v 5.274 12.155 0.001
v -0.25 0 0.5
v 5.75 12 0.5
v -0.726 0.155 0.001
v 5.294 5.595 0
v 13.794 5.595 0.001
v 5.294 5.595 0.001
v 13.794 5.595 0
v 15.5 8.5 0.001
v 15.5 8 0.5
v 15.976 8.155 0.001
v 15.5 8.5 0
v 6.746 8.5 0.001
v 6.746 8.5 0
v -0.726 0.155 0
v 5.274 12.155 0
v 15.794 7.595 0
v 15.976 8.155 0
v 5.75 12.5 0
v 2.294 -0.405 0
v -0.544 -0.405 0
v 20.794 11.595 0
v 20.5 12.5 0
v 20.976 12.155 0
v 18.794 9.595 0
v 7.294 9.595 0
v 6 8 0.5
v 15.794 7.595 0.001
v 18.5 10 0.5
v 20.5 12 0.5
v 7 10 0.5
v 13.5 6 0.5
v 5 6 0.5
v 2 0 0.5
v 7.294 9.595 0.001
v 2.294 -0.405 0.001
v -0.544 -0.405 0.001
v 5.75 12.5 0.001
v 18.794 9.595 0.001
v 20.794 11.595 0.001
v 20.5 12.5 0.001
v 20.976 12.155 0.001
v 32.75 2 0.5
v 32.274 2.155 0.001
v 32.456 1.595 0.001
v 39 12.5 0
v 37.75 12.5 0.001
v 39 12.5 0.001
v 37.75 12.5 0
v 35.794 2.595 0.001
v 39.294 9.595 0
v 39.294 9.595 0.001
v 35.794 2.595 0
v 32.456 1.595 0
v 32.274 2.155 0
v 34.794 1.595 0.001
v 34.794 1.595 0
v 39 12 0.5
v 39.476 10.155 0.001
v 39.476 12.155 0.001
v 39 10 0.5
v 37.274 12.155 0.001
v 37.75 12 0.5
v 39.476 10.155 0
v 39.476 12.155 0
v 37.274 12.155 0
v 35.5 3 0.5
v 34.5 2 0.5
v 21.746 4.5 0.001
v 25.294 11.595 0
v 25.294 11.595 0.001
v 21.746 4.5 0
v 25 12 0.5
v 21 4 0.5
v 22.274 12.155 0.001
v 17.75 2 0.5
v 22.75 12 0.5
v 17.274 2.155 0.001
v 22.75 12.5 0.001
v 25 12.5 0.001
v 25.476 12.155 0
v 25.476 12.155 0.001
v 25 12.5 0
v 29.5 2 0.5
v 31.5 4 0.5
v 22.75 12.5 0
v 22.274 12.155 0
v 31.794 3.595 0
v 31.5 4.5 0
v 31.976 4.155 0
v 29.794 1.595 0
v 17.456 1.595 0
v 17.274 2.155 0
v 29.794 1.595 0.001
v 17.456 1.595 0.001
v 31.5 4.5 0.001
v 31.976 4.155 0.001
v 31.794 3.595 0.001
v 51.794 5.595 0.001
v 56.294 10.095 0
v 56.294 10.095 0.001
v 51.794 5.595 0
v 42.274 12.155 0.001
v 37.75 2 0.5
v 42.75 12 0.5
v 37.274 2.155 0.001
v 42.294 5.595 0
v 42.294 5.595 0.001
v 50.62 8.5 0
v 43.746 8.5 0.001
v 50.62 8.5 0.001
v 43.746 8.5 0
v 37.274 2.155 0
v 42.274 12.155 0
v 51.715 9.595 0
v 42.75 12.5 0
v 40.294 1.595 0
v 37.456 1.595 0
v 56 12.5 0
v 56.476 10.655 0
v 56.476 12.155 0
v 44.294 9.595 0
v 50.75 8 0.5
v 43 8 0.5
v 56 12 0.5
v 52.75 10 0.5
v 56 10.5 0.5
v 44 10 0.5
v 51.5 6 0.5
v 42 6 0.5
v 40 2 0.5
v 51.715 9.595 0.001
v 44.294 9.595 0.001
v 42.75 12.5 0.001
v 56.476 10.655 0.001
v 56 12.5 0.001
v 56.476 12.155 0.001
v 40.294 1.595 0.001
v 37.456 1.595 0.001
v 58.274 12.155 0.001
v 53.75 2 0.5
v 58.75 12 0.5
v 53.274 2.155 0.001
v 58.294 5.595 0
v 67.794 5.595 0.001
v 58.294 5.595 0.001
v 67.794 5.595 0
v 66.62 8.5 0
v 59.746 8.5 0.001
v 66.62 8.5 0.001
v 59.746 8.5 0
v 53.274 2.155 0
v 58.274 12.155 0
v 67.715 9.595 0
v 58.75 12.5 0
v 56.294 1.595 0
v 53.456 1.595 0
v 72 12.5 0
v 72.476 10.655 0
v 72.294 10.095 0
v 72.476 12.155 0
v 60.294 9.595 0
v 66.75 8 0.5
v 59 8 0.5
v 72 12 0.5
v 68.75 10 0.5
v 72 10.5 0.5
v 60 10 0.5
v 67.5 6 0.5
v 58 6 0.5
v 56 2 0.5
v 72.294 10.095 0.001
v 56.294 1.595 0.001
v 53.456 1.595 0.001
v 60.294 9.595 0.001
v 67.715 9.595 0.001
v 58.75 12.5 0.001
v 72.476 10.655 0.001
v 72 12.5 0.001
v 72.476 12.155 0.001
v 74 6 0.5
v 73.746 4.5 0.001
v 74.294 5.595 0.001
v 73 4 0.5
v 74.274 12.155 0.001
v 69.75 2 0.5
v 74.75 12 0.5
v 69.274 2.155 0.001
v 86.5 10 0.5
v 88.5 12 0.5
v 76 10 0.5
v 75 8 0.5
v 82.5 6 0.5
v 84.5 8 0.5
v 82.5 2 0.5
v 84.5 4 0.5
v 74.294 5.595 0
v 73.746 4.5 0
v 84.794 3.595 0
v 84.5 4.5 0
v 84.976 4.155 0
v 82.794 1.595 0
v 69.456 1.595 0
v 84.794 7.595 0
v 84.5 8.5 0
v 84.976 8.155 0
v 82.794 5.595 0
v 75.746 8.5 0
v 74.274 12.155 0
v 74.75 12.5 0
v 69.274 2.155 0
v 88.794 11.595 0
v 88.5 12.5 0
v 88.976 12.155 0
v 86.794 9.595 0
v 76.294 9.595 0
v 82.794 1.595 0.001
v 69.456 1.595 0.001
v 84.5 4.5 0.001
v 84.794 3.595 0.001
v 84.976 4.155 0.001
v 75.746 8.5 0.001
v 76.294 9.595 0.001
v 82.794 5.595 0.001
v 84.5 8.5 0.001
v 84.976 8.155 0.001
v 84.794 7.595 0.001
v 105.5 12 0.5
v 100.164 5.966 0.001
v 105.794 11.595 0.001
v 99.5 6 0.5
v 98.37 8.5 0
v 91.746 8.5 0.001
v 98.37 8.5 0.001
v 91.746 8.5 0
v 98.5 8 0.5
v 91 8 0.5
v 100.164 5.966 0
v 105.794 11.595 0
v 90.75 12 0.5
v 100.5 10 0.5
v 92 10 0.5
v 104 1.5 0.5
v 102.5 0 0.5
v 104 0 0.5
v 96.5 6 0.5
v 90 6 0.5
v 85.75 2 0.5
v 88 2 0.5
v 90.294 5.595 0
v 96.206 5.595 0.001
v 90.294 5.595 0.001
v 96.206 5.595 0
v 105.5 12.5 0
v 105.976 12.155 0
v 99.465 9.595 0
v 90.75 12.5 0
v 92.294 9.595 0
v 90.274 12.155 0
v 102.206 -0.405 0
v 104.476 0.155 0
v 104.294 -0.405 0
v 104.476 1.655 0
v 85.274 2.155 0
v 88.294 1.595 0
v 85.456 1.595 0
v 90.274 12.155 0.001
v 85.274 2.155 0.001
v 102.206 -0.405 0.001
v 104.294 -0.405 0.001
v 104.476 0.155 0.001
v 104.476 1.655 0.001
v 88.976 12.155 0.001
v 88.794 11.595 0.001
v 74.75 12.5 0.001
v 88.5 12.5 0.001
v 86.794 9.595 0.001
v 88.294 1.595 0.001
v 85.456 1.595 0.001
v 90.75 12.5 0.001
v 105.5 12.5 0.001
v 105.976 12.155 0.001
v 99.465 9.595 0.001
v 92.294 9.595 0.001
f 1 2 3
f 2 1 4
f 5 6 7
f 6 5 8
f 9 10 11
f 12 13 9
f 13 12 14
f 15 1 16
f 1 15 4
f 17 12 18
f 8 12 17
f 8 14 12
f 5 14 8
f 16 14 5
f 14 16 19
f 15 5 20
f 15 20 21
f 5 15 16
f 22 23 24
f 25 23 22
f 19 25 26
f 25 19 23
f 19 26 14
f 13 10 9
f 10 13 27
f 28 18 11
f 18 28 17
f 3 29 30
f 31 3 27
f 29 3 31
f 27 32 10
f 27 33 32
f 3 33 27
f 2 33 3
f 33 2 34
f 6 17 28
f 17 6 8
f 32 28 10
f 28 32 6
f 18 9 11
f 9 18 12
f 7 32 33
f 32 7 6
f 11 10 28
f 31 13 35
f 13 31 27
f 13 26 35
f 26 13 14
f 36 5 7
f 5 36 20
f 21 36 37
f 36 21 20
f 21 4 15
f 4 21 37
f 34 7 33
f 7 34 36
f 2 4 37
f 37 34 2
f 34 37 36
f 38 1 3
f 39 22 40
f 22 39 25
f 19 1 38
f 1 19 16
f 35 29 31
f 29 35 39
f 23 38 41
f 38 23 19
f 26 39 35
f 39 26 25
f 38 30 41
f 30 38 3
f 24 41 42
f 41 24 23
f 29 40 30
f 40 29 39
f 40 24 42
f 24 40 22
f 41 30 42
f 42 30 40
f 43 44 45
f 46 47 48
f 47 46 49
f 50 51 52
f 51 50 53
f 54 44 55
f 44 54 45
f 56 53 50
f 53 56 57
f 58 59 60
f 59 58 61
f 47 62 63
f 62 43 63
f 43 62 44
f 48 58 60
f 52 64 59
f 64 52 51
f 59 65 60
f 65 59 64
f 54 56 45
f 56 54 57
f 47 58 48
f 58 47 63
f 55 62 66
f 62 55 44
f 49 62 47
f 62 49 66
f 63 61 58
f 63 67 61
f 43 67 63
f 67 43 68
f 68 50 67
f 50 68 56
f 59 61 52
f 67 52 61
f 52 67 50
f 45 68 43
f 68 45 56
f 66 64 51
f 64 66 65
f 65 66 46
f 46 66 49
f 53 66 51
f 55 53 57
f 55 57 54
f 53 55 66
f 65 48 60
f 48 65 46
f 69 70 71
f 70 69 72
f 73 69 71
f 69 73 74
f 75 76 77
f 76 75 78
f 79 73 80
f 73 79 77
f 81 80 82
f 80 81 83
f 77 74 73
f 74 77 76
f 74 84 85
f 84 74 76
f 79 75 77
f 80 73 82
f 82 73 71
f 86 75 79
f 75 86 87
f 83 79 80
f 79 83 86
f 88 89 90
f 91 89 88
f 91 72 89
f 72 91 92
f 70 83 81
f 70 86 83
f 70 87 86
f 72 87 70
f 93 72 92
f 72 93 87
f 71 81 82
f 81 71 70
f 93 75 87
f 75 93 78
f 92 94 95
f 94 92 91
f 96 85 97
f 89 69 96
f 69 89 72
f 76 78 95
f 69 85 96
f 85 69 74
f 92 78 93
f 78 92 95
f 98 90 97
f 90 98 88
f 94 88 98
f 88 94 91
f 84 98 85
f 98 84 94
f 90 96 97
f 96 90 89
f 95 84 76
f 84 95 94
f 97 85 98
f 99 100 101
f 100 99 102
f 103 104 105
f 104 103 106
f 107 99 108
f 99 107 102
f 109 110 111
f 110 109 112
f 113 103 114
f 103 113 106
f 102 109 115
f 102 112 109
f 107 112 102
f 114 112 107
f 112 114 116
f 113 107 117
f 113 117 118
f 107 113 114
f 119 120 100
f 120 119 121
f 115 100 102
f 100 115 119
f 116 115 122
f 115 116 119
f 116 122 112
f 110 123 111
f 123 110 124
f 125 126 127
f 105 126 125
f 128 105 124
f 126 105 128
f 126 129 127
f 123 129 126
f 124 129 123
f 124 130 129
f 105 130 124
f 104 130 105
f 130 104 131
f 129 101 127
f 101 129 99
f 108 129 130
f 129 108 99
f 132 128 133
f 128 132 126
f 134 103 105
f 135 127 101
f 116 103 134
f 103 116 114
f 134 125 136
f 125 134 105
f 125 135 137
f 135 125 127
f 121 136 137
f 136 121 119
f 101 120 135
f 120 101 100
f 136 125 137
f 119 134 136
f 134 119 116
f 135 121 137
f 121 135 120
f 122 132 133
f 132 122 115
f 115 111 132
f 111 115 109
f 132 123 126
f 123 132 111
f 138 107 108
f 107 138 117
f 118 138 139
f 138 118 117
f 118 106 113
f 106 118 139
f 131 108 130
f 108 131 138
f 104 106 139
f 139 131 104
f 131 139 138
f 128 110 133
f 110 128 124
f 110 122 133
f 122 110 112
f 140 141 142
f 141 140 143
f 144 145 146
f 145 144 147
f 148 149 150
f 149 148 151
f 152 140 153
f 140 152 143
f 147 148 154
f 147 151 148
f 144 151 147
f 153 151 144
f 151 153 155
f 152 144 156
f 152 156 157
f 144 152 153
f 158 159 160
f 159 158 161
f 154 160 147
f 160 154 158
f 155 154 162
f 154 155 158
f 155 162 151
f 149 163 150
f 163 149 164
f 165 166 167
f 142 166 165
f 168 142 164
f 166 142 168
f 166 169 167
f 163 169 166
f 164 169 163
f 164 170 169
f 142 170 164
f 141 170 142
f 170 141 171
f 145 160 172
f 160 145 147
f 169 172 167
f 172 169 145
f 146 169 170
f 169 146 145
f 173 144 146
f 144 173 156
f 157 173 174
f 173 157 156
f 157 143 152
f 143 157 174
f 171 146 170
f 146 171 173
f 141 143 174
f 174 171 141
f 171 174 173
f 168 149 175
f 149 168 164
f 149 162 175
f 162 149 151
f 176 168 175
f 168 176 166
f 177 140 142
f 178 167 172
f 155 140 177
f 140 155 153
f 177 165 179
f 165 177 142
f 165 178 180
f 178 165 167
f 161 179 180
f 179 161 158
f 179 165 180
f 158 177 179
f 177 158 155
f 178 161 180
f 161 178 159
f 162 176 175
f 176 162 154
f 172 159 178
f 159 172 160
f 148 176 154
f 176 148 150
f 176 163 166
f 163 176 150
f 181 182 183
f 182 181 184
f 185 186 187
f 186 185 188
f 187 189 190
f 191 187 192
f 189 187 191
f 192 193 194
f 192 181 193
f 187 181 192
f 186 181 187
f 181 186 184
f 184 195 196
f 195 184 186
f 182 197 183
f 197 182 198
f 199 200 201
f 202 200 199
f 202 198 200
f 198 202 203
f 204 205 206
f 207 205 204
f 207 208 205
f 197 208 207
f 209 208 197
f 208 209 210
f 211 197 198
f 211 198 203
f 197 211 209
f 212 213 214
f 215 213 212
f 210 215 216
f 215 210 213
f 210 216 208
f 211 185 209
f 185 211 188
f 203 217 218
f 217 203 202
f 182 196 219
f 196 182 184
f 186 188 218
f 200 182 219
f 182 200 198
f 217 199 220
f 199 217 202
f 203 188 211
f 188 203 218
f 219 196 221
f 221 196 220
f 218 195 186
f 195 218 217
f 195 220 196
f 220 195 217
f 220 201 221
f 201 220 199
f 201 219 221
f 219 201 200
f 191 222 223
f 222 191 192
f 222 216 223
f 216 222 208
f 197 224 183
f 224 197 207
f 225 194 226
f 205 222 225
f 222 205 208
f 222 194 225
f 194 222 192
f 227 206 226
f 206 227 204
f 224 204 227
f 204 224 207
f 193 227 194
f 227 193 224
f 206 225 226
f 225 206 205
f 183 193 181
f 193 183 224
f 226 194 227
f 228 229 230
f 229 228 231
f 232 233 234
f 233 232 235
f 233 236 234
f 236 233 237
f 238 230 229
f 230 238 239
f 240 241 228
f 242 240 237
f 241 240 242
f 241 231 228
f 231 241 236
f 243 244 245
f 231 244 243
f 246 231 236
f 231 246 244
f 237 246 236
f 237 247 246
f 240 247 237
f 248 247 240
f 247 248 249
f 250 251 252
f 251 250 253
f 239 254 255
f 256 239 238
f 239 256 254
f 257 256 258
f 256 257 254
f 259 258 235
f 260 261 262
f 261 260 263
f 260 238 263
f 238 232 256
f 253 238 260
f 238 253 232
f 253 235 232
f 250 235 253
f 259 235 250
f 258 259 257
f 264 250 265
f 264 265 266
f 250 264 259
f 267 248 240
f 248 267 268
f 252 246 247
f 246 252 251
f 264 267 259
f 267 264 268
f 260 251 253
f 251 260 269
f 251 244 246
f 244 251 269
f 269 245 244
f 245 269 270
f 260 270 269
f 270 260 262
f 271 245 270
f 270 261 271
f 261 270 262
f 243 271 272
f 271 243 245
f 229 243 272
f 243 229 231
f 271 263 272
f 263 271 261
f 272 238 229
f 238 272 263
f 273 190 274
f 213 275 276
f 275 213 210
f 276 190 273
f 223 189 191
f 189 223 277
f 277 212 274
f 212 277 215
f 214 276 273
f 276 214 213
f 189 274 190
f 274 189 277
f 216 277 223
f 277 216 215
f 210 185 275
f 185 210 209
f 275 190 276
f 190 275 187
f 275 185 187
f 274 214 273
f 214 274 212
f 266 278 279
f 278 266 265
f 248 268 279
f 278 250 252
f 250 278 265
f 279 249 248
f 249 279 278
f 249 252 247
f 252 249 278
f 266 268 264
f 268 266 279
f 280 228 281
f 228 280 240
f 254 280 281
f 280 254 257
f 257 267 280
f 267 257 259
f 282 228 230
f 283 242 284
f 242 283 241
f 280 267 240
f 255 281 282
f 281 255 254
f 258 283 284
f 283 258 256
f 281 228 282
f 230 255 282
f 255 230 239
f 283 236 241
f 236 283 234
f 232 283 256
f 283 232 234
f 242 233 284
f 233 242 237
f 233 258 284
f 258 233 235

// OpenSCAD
if ($preview)
{
  S = 2.834646;

  scale([S, S, 1])
  import("orange_text_transparent.svg");
}

t_F = [ [-0.25, 0], [0, 0.5], [5, 10.5], [5.75, 12], [20.5, 12], [18.5, 10], [7, 10], [6, 8], [15.5, 8], [13.5, 6], [5, 6], [2, 0] ];
t_l = [ [17.75, 2], [22.75, 12], [25, 12], [21, 4], [31.5, 4], [29.5, 2] ];
t_i = [ [32.75, 2], [37.75, 12], [39, 12], [39, 10], [35.5, 3], [34.5, 2] ];
t_p = [ [37.75, 2], [42.75, 12], [56, 12], [56, 10.5], [51.5, 6], [42, 6], [40, 2] ];
t_p_h = [ [43, 8], [44, 10], [52.75, 10], [50.75, 8] ];
t_p_2 = [ [53.75, 2], [58.75, 12], [72, 12], [72, 10.5], [67.5, 6], [58, 6], [56, 2] ];
t_p_2_h = [ [59, 8], [60, 10], [68.75, 10], [66.75, 8] ];
t_e = [ [69.75, 2], [74.75, 12], [88.5, 12], [86.5, 10], [76, 10], [75, 8], [84.5, 8], [82.5, 6], [74, 6], [73, 4], [84.5, 4], [82.5, 2] ];
t_r_h = [ [91, 8], [92, 10], [100.5, 10], [98.5, 8] ];
t_r = [ [85.75, 2], [90.75, 12], [105.5, 12], [99.5, 6], [104, 1.5], [104, 0], [102.5, 0], [96.5, 6], [90, 6], [88, 2] ];

p_F = [ 0, 1, 3, 4, 5, 6, 7, 8, 9, 10, 11 ];
p_l = [ 12, 13, 14, 15, 16, 17 ];
p_i = [ 18, 19, 20, 21, 22, 23 ];
p_p = [ 24, 25, 26, 27, 28, 29, 30 ];
p_p_h = [ 31, 32, 33, 34 ];
p_p_2 = [ 35, 36, 37, 38, 39, 40, 41 ];
p_p_2_h = [ 42, 43, 44, 45];
p_e = [ 46, 47, 48, 49, 50, 51, 52, 53, 54, 55, 56, 57 ];
p_r_h = [ 58, 59, 60, 61 ];
p_r = [ 62, 63, 64, 65, 66, 67, 68, 69, 70, 71, 72, 73, 74 ];

t_Flipper = concat(t_F, t_l, t_i, t_p, t_p_h, t_p_2, t_p_2_h, t_e, t_r_h, t_r);

p_Flipper = [ p_F, p_l, p_i, p_p, p_p_h, p_p_2, p_p_2_h, p_e, p_r_h, p_r ];

module flipper()
{
  color("blue")
  polygon(t_Flipper, p_Flipper);
}

chamfer_extrude(height = 0.5, angle = 45)
{
  flipper();
}

module chamfer_extrude(height = 2, angle = 10, center = false) {
    /*
       chamfer_extrude - OpenSCAD operator module to approximate
        chamfered/tapered extrusion of a 2D path
    
       (C) 2019-02, Stewart Russell (scruss) - CC-BY-SA
    
       NOTE: generates _lots_ of facets, as many as
    
            6 * path_points + 4 * $fn - 4
    
       Consequently, use with care or lots of memory.
    
       Example:
            chamfer_extrude(height=5,angle=15,$fn=8)square(10);
    
       generates a 3D object 5 units high with top surface a
        10 x 10 square with sides flaring down and out at 15
        degrees with roughly rounded corners.
    
       Usage:
       
        chamfer_extrude (
            height  =   object height: should be positive
                            for reliable results               ,
            
            angle   =   chamfer angle: degrees                 ,
            
            center  =   false|true: centres object on z-axis [ ,
            
            $fn     =   smoothness of chamfer: higher => smoother
            ]
        ) ... 2D path(s) to extrude ... ;
        
       $fn in the argument list should be set between 6 .. 16:
            <  6 can result in striking/unwanted results
            > 12 is likely a waste of resources.
            
       Lower values of $fn can result in steeper sides than expected.
        
       Extrusion is not truly trapezoidal, but has a very thin
        (0.001 unit) parallel section at the base. This is a 
        limitation of OpenSCAD operators available at the time.
        
    */
    
    // shift base of 3d object to origin or
    //  centre at half height if center == true
    translate([ 0, 
                0, 
                (center == false) ? (height - 0.001) :
                                    (height - 0.002) / 2 ]) {
        minkowski() {
            // convert 2D path to very thin 3D extrusion
            linear_extrude(height = 0.001) {
                children();
            }
            // generate $fn-sided pyramid with apex at origin,
            // rotated "point-up" along the y-axis
            rotate(270) {
                rotate_extrude() {
                    polygon([
                        [ 0,                    0.001 - height  ],
                        [ height * tan(angle),  0.001 - height  ],
                        [ 0,                    0               ]
                    ]);
                }
            }
        }
    }
}
